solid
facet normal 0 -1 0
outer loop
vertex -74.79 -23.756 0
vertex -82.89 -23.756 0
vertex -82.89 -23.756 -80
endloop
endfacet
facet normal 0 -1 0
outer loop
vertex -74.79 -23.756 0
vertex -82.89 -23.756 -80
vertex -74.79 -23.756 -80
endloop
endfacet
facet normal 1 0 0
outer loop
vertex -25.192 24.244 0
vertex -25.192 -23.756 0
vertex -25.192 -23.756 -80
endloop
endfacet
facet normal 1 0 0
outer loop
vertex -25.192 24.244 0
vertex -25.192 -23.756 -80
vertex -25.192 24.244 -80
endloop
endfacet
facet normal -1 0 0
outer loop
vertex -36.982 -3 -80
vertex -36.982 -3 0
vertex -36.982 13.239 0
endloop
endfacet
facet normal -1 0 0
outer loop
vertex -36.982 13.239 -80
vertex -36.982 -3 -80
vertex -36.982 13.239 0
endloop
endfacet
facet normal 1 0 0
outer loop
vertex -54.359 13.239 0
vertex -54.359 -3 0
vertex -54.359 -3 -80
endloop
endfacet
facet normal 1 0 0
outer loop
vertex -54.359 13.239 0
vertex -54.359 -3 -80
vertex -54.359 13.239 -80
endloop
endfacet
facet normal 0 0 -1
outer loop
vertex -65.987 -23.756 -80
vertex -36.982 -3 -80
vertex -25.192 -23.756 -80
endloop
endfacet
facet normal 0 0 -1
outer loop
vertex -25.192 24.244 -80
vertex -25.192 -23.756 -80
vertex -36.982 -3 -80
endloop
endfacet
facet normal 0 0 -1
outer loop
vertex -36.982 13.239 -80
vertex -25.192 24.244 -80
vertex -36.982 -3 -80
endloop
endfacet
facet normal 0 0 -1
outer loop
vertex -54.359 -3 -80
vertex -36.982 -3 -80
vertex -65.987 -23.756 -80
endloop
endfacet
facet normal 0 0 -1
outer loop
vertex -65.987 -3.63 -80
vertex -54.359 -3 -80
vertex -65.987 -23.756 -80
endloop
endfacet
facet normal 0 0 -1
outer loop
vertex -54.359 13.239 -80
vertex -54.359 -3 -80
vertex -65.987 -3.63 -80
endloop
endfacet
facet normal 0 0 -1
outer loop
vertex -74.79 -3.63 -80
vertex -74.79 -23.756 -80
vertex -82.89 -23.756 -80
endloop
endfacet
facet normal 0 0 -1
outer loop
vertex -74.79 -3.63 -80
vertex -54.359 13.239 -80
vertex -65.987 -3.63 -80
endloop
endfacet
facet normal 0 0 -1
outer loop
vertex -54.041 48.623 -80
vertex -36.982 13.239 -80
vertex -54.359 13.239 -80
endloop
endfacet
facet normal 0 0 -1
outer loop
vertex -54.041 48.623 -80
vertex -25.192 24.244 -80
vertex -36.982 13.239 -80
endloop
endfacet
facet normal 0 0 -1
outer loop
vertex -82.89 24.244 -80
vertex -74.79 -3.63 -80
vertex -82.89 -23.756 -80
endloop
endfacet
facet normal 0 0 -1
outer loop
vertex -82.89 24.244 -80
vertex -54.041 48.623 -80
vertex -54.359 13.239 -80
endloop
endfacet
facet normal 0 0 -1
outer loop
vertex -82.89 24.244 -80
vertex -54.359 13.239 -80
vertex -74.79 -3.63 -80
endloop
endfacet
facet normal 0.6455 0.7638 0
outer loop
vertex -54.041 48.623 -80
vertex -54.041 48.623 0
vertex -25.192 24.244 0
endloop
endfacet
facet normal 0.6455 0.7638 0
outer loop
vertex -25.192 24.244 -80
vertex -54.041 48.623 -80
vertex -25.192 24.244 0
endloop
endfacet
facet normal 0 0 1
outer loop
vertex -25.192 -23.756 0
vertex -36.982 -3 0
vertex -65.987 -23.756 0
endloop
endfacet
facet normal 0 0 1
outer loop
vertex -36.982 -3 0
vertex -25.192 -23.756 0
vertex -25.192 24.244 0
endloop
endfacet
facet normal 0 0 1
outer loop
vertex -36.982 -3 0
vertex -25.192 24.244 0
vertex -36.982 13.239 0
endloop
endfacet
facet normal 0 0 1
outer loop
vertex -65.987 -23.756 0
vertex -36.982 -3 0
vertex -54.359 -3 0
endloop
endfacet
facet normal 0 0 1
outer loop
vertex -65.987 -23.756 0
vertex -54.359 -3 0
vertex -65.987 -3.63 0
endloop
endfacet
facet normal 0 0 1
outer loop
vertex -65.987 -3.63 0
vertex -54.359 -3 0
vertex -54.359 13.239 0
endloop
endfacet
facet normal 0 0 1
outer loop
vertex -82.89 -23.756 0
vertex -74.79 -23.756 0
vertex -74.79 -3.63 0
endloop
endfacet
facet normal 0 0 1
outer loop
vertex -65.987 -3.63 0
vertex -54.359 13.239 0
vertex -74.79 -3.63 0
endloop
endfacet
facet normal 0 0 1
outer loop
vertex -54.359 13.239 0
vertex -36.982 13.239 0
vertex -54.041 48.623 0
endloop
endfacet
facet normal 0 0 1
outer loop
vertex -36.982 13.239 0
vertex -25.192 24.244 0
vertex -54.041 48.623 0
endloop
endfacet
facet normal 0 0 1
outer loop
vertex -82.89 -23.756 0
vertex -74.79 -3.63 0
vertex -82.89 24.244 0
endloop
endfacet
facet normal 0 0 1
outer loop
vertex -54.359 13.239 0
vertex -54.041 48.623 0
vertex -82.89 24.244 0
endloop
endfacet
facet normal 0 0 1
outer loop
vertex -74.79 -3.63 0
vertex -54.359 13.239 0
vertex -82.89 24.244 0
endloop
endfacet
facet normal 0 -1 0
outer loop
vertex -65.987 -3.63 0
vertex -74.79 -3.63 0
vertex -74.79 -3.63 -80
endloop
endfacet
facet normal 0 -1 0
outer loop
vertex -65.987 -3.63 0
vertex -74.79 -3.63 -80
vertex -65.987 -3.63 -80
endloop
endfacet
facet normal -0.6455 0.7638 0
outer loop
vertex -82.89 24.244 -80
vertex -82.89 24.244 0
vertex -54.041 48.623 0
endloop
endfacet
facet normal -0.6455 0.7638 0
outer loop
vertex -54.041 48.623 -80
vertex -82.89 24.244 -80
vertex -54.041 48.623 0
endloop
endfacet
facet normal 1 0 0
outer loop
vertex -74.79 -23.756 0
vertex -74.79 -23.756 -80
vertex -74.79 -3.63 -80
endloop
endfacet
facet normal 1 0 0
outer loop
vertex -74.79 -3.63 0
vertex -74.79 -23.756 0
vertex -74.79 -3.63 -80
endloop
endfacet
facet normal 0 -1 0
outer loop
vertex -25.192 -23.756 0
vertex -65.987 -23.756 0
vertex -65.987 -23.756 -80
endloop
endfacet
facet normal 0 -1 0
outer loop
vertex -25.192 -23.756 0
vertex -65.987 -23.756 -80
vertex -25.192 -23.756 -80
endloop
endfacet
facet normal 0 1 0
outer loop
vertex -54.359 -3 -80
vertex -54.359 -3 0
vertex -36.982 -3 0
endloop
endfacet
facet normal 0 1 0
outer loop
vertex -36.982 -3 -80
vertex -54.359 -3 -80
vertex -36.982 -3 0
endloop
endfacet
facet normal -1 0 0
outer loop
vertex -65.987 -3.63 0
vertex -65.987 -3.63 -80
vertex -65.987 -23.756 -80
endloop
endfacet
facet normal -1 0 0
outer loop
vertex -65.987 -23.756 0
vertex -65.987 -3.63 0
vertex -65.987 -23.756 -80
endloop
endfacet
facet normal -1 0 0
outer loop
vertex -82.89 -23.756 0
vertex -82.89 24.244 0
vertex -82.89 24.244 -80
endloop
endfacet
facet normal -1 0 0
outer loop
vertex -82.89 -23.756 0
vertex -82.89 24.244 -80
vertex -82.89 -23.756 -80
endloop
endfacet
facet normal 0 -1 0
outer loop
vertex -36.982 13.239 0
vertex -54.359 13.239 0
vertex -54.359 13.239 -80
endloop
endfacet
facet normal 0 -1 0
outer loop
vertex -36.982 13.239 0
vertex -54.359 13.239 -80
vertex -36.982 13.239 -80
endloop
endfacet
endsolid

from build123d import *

# Parameters (mm, degrees)
SKETCH1_W           = 17.377025631
SKETCH1_H           = 16.239323069
BOSS_EXTRUDE1_DEPTH = 80
BOSS_EXTRUDE2_DEPTH = 80


with BuildPart() as part:
    # Sketch1 → Boss-Extrude1 (new body)
    with BuildSketch(Plane.XY):
        Polygon((-25.191985327, 24.243899858), (-82.889758174, 24.243899858), (-82.889758174, -23.756100142), (-74.789758174, -23.756100142), (-74.789758174, -3.629600036), (-65.986748664, -3.629600036), (-65.986748664, -23.756100142), (-25.191985327, -23.756100142), align=None)
        with Locations((-45.670631465, 5.119661535)):
            Rectangle(SKETCH1_W, SKETCH1_H, mode=Mode.SUBTRACT)
    extrude(amount=-BOSS_EXTRUDE1_DEPTH)

    # Sketch1<6> → Boss-Extrude2 (add)
    with BuildSketch(Plane.XY):
        Polygon((-54.040871751, 48.623240497), (-82.889758174, 24.243899858), (-25.191985327, 24.243899858), align=None)
    extrude(amount=-BOSS_EXTRUDE2_DEPTH)


solid = part.part
